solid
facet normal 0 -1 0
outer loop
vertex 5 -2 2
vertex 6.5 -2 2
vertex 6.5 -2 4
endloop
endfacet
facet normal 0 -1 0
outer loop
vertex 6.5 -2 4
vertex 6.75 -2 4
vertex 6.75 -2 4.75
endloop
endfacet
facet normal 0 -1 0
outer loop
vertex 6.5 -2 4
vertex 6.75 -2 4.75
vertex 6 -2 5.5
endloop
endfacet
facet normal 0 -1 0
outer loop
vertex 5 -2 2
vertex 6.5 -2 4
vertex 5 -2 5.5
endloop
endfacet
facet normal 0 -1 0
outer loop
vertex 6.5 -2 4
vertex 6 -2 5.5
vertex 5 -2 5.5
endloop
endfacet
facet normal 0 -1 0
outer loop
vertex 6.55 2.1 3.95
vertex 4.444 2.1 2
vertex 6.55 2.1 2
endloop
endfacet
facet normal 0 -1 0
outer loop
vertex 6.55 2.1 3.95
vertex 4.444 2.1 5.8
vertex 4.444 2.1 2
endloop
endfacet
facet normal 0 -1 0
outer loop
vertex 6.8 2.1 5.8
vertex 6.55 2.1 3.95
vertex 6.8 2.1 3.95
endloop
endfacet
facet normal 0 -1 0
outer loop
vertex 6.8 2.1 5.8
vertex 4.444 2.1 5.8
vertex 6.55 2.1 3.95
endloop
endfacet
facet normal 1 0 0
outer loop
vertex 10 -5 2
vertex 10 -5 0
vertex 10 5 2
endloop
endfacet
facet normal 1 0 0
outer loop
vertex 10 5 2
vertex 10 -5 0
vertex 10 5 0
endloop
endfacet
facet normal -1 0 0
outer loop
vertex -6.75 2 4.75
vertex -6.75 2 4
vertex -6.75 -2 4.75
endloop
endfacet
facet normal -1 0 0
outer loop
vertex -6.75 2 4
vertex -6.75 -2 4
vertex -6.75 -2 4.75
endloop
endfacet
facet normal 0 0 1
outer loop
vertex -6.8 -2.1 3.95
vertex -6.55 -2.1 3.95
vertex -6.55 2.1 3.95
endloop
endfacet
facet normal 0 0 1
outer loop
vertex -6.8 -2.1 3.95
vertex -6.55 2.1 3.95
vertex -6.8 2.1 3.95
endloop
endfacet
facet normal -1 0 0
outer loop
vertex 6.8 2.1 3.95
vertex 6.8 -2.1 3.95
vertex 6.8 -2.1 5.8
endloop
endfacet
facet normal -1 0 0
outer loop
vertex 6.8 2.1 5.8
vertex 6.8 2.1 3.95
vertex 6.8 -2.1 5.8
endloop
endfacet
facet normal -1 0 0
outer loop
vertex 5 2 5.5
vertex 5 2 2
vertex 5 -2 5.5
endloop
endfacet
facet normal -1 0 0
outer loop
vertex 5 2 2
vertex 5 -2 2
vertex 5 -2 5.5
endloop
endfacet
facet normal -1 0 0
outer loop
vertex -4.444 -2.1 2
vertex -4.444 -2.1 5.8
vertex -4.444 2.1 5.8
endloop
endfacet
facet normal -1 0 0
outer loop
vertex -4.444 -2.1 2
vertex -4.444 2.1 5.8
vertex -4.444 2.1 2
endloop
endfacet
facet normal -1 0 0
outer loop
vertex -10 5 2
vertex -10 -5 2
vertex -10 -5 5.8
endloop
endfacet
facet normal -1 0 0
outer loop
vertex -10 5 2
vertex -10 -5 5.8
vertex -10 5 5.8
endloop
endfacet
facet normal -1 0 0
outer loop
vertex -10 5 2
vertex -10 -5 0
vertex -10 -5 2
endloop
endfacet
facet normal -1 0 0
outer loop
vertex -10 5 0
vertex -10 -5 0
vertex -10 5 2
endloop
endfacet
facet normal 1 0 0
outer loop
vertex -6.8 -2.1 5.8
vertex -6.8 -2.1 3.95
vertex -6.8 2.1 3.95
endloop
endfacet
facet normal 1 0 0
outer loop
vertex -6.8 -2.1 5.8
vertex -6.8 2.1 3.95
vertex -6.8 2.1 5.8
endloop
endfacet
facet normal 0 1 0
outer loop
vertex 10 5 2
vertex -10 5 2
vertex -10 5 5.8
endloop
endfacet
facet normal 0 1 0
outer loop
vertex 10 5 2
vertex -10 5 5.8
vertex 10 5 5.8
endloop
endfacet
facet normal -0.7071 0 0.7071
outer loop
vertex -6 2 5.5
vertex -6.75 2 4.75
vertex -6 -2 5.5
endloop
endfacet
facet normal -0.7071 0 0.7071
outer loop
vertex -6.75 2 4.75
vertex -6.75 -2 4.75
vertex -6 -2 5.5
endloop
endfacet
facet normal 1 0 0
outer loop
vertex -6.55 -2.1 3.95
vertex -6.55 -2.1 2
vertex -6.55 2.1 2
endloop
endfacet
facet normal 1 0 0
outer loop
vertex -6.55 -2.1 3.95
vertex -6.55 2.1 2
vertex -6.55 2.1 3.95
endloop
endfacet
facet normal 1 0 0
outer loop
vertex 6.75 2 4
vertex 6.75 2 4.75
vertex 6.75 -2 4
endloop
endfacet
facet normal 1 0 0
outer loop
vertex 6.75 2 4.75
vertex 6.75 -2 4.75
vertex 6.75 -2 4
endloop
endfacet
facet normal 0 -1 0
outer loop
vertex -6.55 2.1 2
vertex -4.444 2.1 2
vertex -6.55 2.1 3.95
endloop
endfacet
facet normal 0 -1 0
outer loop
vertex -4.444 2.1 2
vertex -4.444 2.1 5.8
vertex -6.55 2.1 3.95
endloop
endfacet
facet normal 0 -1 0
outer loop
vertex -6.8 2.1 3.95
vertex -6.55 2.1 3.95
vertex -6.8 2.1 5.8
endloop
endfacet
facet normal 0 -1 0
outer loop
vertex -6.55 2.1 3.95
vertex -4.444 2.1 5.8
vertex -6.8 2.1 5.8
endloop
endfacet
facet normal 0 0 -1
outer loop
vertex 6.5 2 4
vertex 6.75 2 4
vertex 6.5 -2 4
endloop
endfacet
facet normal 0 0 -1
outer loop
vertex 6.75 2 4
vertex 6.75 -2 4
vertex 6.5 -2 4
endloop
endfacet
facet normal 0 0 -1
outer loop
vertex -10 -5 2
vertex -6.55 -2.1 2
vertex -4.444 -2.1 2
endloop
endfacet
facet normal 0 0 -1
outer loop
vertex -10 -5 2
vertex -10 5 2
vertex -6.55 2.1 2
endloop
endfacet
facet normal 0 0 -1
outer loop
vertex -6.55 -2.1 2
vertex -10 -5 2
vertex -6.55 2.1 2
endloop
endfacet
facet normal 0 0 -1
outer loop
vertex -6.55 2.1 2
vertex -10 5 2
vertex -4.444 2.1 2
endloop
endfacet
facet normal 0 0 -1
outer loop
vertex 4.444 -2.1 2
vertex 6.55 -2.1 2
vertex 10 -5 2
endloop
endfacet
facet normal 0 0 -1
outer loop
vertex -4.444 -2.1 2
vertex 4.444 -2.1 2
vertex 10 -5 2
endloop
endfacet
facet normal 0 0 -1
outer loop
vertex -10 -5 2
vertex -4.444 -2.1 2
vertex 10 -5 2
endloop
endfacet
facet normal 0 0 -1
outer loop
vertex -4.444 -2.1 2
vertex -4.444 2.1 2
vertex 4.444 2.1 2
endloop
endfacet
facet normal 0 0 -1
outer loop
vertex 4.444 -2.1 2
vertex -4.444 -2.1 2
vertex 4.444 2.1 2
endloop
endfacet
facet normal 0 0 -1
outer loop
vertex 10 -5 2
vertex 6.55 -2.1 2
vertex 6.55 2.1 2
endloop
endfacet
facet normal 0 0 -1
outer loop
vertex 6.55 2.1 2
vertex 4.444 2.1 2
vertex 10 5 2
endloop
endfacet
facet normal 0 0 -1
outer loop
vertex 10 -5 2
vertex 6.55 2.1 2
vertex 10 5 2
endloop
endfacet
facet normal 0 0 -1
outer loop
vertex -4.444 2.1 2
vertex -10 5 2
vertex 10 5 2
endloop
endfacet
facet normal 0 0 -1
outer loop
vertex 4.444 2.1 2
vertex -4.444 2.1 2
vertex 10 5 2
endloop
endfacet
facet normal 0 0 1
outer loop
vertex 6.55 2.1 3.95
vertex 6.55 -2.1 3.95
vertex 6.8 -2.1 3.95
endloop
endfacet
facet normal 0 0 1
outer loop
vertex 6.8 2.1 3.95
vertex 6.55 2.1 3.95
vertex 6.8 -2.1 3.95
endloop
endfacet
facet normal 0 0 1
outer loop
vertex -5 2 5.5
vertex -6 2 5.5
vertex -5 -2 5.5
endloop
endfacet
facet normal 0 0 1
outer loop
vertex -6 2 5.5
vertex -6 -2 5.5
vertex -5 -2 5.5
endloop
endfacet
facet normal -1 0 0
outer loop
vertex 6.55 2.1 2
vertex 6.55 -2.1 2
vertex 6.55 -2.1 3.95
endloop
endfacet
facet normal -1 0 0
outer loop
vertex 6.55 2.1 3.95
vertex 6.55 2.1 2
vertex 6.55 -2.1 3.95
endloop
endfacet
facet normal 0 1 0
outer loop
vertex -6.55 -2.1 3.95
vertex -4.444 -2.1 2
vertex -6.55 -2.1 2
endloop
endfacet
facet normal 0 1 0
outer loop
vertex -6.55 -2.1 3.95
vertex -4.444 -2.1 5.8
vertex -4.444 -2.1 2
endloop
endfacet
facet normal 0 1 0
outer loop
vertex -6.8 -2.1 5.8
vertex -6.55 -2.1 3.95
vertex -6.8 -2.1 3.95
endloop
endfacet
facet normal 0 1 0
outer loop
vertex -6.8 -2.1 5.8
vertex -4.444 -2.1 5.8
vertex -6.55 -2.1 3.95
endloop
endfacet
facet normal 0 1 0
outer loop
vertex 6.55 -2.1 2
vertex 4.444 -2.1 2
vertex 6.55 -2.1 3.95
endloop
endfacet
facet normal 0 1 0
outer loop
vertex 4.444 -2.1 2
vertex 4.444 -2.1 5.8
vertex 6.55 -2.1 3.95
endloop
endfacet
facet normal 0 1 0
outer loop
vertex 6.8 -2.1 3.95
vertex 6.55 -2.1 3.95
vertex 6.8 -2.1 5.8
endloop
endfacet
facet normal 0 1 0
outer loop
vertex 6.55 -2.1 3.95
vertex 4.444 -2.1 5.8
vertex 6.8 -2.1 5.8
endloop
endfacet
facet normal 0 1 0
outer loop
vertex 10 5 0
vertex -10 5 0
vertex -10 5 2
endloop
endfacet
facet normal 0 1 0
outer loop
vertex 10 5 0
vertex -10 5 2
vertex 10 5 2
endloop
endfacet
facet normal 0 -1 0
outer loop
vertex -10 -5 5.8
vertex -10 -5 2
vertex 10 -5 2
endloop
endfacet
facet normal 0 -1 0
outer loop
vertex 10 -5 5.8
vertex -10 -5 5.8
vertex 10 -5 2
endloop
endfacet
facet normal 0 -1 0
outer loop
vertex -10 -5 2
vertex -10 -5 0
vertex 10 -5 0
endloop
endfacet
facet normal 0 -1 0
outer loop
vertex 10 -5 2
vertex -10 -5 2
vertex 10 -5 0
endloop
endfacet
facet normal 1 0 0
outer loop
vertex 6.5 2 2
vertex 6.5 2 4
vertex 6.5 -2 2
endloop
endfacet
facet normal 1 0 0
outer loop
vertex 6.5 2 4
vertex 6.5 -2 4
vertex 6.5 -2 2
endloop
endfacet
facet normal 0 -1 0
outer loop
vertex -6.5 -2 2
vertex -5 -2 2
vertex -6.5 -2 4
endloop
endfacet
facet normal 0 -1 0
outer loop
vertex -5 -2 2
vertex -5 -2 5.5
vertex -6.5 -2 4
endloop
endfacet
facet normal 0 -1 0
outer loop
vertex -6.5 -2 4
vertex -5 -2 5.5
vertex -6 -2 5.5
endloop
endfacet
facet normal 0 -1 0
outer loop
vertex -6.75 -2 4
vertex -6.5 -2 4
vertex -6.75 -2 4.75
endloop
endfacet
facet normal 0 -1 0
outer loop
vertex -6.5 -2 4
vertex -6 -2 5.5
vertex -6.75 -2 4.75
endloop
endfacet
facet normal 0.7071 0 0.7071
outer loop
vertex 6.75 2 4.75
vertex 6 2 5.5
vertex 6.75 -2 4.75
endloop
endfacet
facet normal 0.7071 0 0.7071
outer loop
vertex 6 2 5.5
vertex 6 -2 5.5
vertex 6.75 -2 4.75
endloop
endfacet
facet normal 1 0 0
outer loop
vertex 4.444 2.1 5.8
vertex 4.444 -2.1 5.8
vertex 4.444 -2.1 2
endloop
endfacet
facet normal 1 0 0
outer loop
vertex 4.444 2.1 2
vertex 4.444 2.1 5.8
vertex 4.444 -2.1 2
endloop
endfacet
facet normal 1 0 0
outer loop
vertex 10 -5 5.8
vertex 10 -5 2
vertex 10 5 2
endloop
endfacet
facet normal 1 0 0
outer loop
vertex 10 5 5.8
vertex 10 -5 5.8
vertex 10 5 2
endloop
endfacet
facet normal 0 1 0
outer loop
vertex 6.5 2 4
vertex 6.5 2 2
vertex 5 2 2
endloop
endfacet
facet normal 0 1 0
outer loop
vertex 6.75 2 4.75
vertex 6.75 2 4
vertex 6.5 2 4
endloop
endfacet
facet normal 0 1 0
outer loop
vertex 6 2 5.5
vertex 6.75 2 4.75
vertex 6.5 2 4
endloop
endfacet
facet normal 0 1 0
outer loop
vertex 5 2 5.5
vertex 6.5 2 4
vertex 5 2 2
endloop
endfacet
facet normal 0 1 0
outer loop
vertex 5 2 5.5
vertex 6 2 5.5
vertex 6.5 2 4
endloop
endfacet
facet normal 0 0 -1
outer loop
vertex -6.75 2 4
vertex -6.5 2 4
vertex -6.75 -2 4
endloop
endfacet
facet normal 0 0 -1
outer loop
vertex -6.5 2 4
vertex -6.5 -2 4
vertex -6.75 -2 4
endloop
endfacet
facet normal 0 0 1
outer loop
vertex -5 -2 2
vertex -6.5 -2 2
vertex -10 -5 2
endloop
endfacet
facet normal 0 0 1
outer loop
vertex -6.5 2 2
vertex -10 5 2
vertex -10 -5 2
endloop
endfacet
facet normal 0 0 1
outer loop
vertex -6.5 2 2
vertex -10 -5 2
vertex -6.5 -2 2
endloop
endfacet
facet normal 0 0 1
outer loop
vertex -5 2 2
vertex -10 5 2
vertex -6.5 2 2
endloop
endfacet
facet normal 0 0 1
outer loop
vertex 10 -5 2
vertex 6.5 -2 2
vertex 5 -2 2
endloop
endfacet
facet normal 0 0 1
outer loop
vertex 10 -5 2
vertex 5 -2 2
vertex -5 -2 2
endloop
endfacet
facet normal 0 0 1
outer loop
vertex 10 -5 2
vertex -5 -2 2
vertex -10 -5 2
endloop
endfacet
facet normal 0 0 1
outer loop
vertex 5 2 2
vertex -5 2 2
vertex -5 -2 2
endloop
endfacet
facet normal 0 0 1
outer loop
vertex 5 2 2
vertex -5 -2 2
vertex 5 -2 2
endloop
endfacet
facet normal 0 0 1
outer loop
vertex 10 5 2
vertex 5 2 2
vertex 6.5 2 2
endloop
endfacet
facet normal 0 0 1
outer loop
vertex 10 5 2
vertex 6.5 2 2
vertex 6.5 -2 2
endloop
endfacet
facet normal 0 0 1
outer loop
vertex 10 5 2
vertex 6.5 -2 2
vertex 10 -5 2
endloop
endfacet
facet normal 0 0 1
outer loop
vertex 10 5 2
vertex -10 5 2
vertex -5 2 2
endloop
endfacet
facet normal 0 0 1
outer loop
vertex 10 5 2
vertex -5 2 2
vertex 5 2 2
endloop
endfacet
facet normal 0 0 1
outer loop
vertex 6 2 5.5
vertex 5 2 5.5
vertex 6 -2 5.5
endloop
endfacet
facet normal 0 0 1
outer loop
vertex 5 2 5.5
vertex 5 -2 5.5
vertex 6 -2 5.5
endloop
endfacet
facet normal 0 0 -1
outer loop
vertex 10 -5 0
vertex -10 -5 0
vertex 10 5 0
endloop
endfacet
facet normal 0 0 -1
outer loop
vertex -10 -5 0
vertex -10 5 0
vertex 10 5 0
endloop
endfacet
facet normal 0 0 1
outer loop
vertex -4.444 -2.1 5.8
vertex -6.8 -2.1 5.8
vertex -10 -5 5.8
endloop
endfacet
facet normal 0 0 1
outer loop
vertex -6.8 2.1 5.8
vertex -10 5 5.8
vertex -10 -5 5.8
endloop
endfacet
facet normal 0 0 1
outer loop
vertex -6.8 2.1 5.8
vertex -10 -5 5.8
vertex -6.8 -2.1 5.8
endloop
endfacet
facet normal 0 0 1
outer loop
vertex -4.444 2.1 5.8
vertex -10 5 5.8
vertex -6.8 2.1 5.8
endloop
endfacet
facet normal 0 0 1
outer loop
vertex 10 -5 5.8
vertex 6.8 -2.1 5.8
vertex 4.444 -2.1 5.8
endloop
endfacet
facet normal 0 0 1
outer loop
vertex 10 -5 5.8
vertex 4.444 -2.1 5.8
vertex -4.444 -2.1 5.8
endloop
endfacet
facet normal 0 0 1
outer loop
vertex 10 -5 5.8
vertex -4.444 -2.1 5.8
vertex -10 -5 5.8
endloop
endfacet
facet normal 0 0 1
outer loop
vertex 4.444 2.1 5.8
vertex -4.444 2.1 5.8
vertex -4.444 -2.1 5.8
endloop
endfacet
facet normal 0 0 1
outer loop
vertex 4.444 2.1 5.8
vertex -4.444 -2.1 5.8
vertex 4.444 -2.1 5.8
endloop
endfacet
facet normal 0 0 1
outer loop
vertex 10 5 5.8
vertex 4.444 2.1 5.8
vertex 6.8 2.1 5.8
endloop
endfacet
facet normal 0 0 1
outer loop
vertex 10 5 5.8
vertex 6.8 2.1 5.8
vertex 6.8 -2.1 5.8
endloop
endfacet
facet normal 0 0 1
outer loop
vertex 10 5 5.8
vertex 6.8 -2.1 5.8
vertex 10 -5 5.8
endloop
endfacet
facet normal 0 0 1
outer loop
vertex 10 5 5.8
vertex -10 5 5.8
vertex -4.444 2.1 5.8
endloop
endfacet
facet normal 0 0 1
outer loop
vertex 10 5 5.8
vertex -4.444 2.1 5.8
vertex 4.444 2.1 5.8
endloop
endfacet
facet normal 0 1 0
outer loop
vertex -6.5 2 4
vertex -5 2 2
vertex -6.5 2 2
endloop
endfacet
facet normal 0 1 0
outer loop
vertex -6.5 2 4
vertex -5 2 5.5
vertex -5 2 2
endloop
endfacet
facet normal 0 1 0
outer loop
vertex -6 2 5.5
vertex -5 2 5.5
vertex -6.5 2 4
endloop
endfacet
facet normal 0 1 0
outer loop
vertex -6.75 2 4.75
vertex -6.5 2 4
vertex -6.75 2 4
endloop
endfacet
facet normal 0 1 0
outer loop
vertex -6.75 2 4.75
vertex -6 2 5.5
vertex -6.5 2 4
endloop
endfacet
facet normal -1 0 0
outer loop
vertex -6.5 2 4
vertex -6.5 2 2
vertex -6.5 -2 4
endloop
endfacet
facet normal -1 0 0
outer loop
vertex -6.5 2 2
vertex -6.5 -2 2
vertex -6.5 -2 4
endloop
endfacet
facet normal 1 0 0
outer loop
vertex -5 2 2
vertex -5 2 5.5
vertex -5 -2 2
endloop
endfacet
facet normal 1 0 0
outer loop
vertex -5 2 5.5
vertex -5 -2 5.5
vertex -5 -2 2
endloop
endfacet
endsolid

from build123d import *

# Parameters (mm, degrees)
BOX_W            = 20
BOX_H            = 10
BOX_DEPTH        = 2
EXTRUDE_DEPTH    = 2
EXTRUDE001_DEPTH = 2.1
BOX001_W         = 20
BOX001_H         = 10
BOX001_DEPTH     = 3.8


with BuildPart() as cube:
    # Box → Box (new body)
    with BuildSketch(Plane(origin=(-10, -5, 0), x_dir=(1, 0, 0), z_dir=(0, 0, 1))):
        with Locations((10, 5)):
            Rectangle(BOX_W, BOX_H)
    extrude(amount=BOX_DEPTH)


with BuildPart() as fusion:
    # Sketch → Extrude (new body, symmetric)
    with BuildSketch(Plane.XZ):
        Polygon((-10, 0), (-10, 2), (-6.5, 2), (-6.5, 4), (-6.75, 4), (-6.75, 4.75), (-6, 5.5), (-5, 5.5), (-5, 2), (5, 2), (5, 5.5), (6, 5.5), (6.75, 4.75), (6.75, 4), (6.5, 4), (6.5, 2), (10, 2), (10, 0), align=None)
    extrude(amount=EXTRUDE_DEPTH, both=True)

    # Fusion: union Cube
    add(cube.part)


with BuildPart() as extrude001:
    # Sketch001 → Extrude001 (new body, symmetric)
    with BuildSketch(Plane.XZ):
        Polygon((6.55, 0), (6.55, 3.95), (6.8, 3.95), (6.8, 5.8), (4.444162, 5.8), (4.444162, 0), align=None)
    extrude(amount=EXTRUDE001_DEPTH, both=True)


with BuildPart() as fusion001:
    # Part__Mirroring: instance of Extrude001
    add(extrude001.part.mirror(Plane(origin=(0, 0, 0), x_dir=(0, -1, 0), z_dir=(1, 0, 0))))

    # Fusion001: union Extrude001
    add(extrude001.part)


with BuildPart() as cut:
    # Box001 → Box001 (new body)
    with BuildSketch(Plane(origin=(-10, -5, 2), x_dir=(1, 0, 0), z_dir=(0, 0, 1))):
        with Locations((10, 5)):
            Rectangle(BOX001_W, BOX001_H)
    extrude(amount=BOX001_DEPTH)

    # Cut: cut Fusion001
    add(fusion001.part, mode=Mode.SUBTRACT)


solid = Compound([fusion.part, cut.part])
